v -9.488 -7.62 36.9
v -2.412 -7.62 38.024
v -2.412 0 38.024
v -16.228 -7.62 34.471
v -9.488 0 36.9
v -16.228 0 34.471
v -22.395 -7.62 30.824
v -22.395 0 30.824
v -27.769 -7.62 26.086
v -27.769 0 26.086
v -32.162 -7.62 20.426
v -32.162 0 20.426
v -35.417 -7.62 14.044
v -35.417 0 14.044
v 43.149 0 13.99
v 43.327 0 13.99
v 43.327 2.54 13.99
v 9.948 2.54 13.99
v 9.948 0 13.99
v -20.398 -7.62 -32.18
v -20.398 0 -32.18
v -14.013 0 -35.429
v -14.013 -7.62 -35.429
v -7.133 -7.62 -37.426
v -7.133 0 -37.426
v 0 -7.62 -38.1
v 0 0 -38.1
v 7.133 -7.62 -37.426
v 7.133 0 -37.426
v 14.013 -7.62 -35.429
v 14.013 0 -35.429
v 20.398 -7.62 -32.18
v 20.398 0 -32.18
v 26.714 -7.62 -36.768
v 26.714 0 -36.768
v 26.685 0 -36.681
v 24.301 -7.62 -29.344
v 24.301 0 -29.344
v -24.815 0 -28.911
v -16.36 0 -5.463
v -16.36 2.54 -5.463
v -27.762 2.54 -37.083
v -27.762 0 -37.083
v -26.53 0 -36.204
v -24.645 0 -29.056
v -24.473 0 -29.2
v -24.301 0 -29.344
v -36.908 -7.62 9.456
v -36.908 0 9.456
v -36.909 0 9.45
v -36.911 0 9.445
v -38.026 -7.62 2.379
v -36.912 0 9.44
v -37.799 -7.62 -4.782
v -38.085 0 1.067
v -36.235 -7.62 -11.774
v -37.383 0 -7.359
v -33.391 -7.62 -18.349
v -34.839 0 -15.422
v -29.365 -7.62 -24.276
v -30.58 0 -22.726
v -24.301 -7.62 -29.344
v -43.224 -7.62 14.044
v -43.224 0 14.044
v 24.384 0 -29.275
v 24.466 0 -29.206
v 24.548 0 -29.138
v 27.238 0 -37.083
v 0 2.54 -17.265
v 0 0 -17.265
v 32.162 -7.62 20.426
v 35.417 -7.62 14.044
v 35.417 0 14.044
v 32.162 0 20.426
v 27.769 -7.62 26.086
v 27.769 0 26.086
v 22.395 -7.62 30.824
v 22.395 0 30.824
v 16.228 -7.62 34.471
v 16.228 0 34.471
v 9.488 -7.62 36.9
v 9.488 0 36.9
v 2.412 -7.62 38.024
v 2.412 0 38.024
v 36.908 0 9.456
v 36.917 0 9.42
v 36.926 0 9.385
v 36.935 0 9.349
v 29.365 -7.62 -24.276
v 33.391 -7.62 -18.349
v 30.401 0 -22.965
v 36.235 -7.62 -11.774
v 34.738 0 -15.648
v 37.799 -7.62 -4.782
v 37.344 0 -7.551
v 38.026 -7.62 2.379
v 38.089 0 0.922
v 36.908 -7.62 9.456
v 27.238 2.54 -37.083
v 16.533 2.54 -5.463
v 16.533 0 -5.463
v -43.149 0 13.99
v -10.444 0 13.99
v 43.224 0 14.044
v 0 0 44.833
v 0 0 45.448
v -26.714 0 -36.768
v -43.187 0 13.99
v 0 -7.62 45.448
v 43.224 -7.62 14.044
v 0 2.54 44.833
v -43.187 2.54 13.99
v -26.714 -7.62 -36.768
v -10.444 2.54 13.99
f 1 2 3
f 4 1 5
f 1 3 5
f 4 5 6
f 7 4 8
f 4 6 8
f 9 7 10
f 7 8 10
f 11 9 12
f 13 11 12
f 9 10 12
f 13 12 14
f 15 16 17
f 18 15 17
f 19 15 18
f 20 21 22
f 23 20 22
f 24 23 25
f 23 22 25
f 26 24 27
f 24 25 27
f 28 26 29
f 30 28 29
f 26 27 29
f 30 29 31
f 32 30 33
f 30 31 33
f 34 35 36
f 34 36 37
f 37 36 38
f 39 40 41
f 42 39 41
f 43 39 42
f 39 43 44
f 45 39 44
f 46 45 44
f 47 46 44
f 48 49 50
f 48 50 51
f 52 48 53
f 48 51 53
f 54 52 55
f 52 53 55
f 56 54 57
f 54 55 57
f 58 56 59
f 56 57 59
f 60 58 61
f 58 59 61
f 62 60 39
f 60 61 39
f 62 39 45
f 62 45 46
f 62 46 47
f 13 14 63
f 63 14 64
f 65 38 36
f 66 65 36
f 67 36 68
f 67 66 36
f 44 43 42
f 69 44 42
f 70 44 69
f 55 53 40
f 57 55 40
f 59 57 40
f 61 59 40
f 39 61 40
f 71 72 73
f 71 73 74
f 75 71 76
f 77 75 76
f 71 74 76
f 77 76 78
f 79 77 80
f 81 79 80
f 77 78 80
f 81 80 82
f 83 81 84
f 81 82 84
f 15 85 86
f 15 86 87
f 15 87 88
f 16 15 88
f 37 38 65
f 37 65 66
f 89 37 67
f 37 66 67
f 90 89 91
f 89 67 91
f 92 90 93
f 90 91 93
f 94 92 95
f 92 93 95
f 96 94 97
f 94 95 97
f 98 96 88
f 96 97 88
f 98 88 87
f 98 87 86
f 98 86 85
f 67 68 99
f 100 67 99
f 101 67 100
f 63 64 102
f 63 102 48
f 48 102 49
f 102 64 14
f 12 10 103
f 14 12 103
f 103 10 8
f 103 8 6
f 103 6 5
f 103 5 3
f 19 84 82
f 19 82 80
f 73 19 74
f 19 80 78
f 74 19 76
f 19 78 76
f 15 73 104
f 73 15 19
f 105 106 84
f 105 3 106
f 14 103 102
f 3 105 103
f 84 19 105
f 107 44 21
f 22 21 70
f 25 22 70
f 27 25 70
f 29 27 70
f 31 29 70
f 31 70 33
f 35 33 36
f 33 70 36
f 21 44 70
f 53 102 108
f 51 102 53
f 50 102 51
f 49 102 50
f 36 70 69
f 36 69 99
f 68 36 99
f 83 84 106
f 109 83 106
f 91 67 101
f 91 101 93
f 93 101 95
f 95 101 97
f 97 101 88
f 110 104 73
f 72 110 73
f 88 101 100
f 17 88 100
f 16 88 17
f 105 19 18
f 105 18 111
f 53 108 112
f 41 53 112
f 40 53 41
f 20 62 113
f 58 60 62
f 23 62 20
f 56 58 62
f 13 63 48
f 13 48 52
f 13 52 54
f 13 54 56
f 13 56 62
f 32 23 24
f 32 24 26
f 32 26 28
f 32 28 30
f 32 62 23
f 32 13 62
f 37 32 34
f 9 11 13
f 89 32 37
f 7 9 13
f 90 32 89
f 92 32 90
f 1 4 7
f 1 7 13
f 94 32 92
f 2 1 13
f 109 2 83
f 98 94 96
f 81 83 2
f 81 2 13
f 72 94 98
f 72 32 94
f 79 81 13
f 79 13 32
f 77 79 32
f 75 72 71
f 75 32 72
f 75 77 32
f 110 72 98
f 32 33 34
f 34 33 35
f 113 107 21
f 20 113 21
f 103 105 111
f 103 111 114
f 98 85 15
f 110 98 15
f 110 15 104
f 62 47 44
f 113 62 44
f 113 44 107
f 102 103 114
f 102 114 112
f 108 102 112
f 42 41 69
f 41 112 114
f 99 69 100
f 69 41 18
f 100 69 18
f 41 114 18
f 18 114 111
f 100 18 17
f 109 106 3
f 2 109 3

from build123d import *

# Parameters (mm, degrees)
F0_R     = 38.1
F1_DEPTH = 7.62
F3_DEPTH = 7.62
F5_DEPTH = 2.54


with BuildPart() as f1:
    # F0 (on Front) → F1 (new body)
    with BuildSketch(Plane.XZ):
        Circle(F0_R)
    extrude(amount=F1_DEPTH)

    # F2 (on Front) → F3 (join)
    with BuildSketch(Plane.XZ):
        Polygon((43.2237411543, 14.0442448459), (10.2037411543, 14.0442448459), (16.51, -5.3644241848), align=None)
        Polygon((16.51, -5.3644241848), (10.2037411543, 14.0442448459), (-10.2037411543, 14.0442448459), (-16.51, -5.3644241848), (0, -17.3596413222), align=None)
        Polygon((-10.2037411543, 14.0442448459), (10.2037411543, 14.0442448459), (0, 45.448131014), align=None)
        Polygon((26.7137411543, -36.7683103529), (16.51, -5.3644241848), (0, -17.3596413222), align=None)
        Polygon((-16.51, -5.3644241848), (-10.2037411543, 14.0442448459), (-43.2237411543, 14.0442448459), align=None)
        Polygon((-26.7137411543, -36.7683103529), (0, -17.3596413222), (-16.51, -5.3644241848), align=None)
    extrude(amount=F3_DEPTH)

    # F4 (on face) → F5 (join)
    with BuildSketch(Plane.XZ):
        Polygon((16.5334772319, -5.4629510269), (9.9479760975, 13.9897912741), (-10.4440292343, 13.9897912741), (-16.3596607745, -5.4629510269), (0, -17.2653142363), align=None)
        Polygon((43.3266088367, 13.9897912741), (9.9479760975, 13.9897912741), (16.5334772319, -5.4629510269), align=None)
        Polygon((-10.4440292343, 13.9897912741), (9.9479760975, 13.9897912741), (0, 44.8327288032), align=None)
        Polygon((-16.3596607745, -5.4629510269), (-10.4440292343, 13.9897912741), (-43.1872978806, 13.9897912741), align=None)
        Polygon((27.2381013996, -37.0830648364), (16.5334772319, -5.4629510269), (0, -17.2653142363), align=None)
        Polygon((0, -17.2653142363), (-16.3596607745, -5.4629510269), (-27.761925516, -37.0830648364), align=None)
    extrude(amount=-F5_DEPTH)


solid = f1.part
